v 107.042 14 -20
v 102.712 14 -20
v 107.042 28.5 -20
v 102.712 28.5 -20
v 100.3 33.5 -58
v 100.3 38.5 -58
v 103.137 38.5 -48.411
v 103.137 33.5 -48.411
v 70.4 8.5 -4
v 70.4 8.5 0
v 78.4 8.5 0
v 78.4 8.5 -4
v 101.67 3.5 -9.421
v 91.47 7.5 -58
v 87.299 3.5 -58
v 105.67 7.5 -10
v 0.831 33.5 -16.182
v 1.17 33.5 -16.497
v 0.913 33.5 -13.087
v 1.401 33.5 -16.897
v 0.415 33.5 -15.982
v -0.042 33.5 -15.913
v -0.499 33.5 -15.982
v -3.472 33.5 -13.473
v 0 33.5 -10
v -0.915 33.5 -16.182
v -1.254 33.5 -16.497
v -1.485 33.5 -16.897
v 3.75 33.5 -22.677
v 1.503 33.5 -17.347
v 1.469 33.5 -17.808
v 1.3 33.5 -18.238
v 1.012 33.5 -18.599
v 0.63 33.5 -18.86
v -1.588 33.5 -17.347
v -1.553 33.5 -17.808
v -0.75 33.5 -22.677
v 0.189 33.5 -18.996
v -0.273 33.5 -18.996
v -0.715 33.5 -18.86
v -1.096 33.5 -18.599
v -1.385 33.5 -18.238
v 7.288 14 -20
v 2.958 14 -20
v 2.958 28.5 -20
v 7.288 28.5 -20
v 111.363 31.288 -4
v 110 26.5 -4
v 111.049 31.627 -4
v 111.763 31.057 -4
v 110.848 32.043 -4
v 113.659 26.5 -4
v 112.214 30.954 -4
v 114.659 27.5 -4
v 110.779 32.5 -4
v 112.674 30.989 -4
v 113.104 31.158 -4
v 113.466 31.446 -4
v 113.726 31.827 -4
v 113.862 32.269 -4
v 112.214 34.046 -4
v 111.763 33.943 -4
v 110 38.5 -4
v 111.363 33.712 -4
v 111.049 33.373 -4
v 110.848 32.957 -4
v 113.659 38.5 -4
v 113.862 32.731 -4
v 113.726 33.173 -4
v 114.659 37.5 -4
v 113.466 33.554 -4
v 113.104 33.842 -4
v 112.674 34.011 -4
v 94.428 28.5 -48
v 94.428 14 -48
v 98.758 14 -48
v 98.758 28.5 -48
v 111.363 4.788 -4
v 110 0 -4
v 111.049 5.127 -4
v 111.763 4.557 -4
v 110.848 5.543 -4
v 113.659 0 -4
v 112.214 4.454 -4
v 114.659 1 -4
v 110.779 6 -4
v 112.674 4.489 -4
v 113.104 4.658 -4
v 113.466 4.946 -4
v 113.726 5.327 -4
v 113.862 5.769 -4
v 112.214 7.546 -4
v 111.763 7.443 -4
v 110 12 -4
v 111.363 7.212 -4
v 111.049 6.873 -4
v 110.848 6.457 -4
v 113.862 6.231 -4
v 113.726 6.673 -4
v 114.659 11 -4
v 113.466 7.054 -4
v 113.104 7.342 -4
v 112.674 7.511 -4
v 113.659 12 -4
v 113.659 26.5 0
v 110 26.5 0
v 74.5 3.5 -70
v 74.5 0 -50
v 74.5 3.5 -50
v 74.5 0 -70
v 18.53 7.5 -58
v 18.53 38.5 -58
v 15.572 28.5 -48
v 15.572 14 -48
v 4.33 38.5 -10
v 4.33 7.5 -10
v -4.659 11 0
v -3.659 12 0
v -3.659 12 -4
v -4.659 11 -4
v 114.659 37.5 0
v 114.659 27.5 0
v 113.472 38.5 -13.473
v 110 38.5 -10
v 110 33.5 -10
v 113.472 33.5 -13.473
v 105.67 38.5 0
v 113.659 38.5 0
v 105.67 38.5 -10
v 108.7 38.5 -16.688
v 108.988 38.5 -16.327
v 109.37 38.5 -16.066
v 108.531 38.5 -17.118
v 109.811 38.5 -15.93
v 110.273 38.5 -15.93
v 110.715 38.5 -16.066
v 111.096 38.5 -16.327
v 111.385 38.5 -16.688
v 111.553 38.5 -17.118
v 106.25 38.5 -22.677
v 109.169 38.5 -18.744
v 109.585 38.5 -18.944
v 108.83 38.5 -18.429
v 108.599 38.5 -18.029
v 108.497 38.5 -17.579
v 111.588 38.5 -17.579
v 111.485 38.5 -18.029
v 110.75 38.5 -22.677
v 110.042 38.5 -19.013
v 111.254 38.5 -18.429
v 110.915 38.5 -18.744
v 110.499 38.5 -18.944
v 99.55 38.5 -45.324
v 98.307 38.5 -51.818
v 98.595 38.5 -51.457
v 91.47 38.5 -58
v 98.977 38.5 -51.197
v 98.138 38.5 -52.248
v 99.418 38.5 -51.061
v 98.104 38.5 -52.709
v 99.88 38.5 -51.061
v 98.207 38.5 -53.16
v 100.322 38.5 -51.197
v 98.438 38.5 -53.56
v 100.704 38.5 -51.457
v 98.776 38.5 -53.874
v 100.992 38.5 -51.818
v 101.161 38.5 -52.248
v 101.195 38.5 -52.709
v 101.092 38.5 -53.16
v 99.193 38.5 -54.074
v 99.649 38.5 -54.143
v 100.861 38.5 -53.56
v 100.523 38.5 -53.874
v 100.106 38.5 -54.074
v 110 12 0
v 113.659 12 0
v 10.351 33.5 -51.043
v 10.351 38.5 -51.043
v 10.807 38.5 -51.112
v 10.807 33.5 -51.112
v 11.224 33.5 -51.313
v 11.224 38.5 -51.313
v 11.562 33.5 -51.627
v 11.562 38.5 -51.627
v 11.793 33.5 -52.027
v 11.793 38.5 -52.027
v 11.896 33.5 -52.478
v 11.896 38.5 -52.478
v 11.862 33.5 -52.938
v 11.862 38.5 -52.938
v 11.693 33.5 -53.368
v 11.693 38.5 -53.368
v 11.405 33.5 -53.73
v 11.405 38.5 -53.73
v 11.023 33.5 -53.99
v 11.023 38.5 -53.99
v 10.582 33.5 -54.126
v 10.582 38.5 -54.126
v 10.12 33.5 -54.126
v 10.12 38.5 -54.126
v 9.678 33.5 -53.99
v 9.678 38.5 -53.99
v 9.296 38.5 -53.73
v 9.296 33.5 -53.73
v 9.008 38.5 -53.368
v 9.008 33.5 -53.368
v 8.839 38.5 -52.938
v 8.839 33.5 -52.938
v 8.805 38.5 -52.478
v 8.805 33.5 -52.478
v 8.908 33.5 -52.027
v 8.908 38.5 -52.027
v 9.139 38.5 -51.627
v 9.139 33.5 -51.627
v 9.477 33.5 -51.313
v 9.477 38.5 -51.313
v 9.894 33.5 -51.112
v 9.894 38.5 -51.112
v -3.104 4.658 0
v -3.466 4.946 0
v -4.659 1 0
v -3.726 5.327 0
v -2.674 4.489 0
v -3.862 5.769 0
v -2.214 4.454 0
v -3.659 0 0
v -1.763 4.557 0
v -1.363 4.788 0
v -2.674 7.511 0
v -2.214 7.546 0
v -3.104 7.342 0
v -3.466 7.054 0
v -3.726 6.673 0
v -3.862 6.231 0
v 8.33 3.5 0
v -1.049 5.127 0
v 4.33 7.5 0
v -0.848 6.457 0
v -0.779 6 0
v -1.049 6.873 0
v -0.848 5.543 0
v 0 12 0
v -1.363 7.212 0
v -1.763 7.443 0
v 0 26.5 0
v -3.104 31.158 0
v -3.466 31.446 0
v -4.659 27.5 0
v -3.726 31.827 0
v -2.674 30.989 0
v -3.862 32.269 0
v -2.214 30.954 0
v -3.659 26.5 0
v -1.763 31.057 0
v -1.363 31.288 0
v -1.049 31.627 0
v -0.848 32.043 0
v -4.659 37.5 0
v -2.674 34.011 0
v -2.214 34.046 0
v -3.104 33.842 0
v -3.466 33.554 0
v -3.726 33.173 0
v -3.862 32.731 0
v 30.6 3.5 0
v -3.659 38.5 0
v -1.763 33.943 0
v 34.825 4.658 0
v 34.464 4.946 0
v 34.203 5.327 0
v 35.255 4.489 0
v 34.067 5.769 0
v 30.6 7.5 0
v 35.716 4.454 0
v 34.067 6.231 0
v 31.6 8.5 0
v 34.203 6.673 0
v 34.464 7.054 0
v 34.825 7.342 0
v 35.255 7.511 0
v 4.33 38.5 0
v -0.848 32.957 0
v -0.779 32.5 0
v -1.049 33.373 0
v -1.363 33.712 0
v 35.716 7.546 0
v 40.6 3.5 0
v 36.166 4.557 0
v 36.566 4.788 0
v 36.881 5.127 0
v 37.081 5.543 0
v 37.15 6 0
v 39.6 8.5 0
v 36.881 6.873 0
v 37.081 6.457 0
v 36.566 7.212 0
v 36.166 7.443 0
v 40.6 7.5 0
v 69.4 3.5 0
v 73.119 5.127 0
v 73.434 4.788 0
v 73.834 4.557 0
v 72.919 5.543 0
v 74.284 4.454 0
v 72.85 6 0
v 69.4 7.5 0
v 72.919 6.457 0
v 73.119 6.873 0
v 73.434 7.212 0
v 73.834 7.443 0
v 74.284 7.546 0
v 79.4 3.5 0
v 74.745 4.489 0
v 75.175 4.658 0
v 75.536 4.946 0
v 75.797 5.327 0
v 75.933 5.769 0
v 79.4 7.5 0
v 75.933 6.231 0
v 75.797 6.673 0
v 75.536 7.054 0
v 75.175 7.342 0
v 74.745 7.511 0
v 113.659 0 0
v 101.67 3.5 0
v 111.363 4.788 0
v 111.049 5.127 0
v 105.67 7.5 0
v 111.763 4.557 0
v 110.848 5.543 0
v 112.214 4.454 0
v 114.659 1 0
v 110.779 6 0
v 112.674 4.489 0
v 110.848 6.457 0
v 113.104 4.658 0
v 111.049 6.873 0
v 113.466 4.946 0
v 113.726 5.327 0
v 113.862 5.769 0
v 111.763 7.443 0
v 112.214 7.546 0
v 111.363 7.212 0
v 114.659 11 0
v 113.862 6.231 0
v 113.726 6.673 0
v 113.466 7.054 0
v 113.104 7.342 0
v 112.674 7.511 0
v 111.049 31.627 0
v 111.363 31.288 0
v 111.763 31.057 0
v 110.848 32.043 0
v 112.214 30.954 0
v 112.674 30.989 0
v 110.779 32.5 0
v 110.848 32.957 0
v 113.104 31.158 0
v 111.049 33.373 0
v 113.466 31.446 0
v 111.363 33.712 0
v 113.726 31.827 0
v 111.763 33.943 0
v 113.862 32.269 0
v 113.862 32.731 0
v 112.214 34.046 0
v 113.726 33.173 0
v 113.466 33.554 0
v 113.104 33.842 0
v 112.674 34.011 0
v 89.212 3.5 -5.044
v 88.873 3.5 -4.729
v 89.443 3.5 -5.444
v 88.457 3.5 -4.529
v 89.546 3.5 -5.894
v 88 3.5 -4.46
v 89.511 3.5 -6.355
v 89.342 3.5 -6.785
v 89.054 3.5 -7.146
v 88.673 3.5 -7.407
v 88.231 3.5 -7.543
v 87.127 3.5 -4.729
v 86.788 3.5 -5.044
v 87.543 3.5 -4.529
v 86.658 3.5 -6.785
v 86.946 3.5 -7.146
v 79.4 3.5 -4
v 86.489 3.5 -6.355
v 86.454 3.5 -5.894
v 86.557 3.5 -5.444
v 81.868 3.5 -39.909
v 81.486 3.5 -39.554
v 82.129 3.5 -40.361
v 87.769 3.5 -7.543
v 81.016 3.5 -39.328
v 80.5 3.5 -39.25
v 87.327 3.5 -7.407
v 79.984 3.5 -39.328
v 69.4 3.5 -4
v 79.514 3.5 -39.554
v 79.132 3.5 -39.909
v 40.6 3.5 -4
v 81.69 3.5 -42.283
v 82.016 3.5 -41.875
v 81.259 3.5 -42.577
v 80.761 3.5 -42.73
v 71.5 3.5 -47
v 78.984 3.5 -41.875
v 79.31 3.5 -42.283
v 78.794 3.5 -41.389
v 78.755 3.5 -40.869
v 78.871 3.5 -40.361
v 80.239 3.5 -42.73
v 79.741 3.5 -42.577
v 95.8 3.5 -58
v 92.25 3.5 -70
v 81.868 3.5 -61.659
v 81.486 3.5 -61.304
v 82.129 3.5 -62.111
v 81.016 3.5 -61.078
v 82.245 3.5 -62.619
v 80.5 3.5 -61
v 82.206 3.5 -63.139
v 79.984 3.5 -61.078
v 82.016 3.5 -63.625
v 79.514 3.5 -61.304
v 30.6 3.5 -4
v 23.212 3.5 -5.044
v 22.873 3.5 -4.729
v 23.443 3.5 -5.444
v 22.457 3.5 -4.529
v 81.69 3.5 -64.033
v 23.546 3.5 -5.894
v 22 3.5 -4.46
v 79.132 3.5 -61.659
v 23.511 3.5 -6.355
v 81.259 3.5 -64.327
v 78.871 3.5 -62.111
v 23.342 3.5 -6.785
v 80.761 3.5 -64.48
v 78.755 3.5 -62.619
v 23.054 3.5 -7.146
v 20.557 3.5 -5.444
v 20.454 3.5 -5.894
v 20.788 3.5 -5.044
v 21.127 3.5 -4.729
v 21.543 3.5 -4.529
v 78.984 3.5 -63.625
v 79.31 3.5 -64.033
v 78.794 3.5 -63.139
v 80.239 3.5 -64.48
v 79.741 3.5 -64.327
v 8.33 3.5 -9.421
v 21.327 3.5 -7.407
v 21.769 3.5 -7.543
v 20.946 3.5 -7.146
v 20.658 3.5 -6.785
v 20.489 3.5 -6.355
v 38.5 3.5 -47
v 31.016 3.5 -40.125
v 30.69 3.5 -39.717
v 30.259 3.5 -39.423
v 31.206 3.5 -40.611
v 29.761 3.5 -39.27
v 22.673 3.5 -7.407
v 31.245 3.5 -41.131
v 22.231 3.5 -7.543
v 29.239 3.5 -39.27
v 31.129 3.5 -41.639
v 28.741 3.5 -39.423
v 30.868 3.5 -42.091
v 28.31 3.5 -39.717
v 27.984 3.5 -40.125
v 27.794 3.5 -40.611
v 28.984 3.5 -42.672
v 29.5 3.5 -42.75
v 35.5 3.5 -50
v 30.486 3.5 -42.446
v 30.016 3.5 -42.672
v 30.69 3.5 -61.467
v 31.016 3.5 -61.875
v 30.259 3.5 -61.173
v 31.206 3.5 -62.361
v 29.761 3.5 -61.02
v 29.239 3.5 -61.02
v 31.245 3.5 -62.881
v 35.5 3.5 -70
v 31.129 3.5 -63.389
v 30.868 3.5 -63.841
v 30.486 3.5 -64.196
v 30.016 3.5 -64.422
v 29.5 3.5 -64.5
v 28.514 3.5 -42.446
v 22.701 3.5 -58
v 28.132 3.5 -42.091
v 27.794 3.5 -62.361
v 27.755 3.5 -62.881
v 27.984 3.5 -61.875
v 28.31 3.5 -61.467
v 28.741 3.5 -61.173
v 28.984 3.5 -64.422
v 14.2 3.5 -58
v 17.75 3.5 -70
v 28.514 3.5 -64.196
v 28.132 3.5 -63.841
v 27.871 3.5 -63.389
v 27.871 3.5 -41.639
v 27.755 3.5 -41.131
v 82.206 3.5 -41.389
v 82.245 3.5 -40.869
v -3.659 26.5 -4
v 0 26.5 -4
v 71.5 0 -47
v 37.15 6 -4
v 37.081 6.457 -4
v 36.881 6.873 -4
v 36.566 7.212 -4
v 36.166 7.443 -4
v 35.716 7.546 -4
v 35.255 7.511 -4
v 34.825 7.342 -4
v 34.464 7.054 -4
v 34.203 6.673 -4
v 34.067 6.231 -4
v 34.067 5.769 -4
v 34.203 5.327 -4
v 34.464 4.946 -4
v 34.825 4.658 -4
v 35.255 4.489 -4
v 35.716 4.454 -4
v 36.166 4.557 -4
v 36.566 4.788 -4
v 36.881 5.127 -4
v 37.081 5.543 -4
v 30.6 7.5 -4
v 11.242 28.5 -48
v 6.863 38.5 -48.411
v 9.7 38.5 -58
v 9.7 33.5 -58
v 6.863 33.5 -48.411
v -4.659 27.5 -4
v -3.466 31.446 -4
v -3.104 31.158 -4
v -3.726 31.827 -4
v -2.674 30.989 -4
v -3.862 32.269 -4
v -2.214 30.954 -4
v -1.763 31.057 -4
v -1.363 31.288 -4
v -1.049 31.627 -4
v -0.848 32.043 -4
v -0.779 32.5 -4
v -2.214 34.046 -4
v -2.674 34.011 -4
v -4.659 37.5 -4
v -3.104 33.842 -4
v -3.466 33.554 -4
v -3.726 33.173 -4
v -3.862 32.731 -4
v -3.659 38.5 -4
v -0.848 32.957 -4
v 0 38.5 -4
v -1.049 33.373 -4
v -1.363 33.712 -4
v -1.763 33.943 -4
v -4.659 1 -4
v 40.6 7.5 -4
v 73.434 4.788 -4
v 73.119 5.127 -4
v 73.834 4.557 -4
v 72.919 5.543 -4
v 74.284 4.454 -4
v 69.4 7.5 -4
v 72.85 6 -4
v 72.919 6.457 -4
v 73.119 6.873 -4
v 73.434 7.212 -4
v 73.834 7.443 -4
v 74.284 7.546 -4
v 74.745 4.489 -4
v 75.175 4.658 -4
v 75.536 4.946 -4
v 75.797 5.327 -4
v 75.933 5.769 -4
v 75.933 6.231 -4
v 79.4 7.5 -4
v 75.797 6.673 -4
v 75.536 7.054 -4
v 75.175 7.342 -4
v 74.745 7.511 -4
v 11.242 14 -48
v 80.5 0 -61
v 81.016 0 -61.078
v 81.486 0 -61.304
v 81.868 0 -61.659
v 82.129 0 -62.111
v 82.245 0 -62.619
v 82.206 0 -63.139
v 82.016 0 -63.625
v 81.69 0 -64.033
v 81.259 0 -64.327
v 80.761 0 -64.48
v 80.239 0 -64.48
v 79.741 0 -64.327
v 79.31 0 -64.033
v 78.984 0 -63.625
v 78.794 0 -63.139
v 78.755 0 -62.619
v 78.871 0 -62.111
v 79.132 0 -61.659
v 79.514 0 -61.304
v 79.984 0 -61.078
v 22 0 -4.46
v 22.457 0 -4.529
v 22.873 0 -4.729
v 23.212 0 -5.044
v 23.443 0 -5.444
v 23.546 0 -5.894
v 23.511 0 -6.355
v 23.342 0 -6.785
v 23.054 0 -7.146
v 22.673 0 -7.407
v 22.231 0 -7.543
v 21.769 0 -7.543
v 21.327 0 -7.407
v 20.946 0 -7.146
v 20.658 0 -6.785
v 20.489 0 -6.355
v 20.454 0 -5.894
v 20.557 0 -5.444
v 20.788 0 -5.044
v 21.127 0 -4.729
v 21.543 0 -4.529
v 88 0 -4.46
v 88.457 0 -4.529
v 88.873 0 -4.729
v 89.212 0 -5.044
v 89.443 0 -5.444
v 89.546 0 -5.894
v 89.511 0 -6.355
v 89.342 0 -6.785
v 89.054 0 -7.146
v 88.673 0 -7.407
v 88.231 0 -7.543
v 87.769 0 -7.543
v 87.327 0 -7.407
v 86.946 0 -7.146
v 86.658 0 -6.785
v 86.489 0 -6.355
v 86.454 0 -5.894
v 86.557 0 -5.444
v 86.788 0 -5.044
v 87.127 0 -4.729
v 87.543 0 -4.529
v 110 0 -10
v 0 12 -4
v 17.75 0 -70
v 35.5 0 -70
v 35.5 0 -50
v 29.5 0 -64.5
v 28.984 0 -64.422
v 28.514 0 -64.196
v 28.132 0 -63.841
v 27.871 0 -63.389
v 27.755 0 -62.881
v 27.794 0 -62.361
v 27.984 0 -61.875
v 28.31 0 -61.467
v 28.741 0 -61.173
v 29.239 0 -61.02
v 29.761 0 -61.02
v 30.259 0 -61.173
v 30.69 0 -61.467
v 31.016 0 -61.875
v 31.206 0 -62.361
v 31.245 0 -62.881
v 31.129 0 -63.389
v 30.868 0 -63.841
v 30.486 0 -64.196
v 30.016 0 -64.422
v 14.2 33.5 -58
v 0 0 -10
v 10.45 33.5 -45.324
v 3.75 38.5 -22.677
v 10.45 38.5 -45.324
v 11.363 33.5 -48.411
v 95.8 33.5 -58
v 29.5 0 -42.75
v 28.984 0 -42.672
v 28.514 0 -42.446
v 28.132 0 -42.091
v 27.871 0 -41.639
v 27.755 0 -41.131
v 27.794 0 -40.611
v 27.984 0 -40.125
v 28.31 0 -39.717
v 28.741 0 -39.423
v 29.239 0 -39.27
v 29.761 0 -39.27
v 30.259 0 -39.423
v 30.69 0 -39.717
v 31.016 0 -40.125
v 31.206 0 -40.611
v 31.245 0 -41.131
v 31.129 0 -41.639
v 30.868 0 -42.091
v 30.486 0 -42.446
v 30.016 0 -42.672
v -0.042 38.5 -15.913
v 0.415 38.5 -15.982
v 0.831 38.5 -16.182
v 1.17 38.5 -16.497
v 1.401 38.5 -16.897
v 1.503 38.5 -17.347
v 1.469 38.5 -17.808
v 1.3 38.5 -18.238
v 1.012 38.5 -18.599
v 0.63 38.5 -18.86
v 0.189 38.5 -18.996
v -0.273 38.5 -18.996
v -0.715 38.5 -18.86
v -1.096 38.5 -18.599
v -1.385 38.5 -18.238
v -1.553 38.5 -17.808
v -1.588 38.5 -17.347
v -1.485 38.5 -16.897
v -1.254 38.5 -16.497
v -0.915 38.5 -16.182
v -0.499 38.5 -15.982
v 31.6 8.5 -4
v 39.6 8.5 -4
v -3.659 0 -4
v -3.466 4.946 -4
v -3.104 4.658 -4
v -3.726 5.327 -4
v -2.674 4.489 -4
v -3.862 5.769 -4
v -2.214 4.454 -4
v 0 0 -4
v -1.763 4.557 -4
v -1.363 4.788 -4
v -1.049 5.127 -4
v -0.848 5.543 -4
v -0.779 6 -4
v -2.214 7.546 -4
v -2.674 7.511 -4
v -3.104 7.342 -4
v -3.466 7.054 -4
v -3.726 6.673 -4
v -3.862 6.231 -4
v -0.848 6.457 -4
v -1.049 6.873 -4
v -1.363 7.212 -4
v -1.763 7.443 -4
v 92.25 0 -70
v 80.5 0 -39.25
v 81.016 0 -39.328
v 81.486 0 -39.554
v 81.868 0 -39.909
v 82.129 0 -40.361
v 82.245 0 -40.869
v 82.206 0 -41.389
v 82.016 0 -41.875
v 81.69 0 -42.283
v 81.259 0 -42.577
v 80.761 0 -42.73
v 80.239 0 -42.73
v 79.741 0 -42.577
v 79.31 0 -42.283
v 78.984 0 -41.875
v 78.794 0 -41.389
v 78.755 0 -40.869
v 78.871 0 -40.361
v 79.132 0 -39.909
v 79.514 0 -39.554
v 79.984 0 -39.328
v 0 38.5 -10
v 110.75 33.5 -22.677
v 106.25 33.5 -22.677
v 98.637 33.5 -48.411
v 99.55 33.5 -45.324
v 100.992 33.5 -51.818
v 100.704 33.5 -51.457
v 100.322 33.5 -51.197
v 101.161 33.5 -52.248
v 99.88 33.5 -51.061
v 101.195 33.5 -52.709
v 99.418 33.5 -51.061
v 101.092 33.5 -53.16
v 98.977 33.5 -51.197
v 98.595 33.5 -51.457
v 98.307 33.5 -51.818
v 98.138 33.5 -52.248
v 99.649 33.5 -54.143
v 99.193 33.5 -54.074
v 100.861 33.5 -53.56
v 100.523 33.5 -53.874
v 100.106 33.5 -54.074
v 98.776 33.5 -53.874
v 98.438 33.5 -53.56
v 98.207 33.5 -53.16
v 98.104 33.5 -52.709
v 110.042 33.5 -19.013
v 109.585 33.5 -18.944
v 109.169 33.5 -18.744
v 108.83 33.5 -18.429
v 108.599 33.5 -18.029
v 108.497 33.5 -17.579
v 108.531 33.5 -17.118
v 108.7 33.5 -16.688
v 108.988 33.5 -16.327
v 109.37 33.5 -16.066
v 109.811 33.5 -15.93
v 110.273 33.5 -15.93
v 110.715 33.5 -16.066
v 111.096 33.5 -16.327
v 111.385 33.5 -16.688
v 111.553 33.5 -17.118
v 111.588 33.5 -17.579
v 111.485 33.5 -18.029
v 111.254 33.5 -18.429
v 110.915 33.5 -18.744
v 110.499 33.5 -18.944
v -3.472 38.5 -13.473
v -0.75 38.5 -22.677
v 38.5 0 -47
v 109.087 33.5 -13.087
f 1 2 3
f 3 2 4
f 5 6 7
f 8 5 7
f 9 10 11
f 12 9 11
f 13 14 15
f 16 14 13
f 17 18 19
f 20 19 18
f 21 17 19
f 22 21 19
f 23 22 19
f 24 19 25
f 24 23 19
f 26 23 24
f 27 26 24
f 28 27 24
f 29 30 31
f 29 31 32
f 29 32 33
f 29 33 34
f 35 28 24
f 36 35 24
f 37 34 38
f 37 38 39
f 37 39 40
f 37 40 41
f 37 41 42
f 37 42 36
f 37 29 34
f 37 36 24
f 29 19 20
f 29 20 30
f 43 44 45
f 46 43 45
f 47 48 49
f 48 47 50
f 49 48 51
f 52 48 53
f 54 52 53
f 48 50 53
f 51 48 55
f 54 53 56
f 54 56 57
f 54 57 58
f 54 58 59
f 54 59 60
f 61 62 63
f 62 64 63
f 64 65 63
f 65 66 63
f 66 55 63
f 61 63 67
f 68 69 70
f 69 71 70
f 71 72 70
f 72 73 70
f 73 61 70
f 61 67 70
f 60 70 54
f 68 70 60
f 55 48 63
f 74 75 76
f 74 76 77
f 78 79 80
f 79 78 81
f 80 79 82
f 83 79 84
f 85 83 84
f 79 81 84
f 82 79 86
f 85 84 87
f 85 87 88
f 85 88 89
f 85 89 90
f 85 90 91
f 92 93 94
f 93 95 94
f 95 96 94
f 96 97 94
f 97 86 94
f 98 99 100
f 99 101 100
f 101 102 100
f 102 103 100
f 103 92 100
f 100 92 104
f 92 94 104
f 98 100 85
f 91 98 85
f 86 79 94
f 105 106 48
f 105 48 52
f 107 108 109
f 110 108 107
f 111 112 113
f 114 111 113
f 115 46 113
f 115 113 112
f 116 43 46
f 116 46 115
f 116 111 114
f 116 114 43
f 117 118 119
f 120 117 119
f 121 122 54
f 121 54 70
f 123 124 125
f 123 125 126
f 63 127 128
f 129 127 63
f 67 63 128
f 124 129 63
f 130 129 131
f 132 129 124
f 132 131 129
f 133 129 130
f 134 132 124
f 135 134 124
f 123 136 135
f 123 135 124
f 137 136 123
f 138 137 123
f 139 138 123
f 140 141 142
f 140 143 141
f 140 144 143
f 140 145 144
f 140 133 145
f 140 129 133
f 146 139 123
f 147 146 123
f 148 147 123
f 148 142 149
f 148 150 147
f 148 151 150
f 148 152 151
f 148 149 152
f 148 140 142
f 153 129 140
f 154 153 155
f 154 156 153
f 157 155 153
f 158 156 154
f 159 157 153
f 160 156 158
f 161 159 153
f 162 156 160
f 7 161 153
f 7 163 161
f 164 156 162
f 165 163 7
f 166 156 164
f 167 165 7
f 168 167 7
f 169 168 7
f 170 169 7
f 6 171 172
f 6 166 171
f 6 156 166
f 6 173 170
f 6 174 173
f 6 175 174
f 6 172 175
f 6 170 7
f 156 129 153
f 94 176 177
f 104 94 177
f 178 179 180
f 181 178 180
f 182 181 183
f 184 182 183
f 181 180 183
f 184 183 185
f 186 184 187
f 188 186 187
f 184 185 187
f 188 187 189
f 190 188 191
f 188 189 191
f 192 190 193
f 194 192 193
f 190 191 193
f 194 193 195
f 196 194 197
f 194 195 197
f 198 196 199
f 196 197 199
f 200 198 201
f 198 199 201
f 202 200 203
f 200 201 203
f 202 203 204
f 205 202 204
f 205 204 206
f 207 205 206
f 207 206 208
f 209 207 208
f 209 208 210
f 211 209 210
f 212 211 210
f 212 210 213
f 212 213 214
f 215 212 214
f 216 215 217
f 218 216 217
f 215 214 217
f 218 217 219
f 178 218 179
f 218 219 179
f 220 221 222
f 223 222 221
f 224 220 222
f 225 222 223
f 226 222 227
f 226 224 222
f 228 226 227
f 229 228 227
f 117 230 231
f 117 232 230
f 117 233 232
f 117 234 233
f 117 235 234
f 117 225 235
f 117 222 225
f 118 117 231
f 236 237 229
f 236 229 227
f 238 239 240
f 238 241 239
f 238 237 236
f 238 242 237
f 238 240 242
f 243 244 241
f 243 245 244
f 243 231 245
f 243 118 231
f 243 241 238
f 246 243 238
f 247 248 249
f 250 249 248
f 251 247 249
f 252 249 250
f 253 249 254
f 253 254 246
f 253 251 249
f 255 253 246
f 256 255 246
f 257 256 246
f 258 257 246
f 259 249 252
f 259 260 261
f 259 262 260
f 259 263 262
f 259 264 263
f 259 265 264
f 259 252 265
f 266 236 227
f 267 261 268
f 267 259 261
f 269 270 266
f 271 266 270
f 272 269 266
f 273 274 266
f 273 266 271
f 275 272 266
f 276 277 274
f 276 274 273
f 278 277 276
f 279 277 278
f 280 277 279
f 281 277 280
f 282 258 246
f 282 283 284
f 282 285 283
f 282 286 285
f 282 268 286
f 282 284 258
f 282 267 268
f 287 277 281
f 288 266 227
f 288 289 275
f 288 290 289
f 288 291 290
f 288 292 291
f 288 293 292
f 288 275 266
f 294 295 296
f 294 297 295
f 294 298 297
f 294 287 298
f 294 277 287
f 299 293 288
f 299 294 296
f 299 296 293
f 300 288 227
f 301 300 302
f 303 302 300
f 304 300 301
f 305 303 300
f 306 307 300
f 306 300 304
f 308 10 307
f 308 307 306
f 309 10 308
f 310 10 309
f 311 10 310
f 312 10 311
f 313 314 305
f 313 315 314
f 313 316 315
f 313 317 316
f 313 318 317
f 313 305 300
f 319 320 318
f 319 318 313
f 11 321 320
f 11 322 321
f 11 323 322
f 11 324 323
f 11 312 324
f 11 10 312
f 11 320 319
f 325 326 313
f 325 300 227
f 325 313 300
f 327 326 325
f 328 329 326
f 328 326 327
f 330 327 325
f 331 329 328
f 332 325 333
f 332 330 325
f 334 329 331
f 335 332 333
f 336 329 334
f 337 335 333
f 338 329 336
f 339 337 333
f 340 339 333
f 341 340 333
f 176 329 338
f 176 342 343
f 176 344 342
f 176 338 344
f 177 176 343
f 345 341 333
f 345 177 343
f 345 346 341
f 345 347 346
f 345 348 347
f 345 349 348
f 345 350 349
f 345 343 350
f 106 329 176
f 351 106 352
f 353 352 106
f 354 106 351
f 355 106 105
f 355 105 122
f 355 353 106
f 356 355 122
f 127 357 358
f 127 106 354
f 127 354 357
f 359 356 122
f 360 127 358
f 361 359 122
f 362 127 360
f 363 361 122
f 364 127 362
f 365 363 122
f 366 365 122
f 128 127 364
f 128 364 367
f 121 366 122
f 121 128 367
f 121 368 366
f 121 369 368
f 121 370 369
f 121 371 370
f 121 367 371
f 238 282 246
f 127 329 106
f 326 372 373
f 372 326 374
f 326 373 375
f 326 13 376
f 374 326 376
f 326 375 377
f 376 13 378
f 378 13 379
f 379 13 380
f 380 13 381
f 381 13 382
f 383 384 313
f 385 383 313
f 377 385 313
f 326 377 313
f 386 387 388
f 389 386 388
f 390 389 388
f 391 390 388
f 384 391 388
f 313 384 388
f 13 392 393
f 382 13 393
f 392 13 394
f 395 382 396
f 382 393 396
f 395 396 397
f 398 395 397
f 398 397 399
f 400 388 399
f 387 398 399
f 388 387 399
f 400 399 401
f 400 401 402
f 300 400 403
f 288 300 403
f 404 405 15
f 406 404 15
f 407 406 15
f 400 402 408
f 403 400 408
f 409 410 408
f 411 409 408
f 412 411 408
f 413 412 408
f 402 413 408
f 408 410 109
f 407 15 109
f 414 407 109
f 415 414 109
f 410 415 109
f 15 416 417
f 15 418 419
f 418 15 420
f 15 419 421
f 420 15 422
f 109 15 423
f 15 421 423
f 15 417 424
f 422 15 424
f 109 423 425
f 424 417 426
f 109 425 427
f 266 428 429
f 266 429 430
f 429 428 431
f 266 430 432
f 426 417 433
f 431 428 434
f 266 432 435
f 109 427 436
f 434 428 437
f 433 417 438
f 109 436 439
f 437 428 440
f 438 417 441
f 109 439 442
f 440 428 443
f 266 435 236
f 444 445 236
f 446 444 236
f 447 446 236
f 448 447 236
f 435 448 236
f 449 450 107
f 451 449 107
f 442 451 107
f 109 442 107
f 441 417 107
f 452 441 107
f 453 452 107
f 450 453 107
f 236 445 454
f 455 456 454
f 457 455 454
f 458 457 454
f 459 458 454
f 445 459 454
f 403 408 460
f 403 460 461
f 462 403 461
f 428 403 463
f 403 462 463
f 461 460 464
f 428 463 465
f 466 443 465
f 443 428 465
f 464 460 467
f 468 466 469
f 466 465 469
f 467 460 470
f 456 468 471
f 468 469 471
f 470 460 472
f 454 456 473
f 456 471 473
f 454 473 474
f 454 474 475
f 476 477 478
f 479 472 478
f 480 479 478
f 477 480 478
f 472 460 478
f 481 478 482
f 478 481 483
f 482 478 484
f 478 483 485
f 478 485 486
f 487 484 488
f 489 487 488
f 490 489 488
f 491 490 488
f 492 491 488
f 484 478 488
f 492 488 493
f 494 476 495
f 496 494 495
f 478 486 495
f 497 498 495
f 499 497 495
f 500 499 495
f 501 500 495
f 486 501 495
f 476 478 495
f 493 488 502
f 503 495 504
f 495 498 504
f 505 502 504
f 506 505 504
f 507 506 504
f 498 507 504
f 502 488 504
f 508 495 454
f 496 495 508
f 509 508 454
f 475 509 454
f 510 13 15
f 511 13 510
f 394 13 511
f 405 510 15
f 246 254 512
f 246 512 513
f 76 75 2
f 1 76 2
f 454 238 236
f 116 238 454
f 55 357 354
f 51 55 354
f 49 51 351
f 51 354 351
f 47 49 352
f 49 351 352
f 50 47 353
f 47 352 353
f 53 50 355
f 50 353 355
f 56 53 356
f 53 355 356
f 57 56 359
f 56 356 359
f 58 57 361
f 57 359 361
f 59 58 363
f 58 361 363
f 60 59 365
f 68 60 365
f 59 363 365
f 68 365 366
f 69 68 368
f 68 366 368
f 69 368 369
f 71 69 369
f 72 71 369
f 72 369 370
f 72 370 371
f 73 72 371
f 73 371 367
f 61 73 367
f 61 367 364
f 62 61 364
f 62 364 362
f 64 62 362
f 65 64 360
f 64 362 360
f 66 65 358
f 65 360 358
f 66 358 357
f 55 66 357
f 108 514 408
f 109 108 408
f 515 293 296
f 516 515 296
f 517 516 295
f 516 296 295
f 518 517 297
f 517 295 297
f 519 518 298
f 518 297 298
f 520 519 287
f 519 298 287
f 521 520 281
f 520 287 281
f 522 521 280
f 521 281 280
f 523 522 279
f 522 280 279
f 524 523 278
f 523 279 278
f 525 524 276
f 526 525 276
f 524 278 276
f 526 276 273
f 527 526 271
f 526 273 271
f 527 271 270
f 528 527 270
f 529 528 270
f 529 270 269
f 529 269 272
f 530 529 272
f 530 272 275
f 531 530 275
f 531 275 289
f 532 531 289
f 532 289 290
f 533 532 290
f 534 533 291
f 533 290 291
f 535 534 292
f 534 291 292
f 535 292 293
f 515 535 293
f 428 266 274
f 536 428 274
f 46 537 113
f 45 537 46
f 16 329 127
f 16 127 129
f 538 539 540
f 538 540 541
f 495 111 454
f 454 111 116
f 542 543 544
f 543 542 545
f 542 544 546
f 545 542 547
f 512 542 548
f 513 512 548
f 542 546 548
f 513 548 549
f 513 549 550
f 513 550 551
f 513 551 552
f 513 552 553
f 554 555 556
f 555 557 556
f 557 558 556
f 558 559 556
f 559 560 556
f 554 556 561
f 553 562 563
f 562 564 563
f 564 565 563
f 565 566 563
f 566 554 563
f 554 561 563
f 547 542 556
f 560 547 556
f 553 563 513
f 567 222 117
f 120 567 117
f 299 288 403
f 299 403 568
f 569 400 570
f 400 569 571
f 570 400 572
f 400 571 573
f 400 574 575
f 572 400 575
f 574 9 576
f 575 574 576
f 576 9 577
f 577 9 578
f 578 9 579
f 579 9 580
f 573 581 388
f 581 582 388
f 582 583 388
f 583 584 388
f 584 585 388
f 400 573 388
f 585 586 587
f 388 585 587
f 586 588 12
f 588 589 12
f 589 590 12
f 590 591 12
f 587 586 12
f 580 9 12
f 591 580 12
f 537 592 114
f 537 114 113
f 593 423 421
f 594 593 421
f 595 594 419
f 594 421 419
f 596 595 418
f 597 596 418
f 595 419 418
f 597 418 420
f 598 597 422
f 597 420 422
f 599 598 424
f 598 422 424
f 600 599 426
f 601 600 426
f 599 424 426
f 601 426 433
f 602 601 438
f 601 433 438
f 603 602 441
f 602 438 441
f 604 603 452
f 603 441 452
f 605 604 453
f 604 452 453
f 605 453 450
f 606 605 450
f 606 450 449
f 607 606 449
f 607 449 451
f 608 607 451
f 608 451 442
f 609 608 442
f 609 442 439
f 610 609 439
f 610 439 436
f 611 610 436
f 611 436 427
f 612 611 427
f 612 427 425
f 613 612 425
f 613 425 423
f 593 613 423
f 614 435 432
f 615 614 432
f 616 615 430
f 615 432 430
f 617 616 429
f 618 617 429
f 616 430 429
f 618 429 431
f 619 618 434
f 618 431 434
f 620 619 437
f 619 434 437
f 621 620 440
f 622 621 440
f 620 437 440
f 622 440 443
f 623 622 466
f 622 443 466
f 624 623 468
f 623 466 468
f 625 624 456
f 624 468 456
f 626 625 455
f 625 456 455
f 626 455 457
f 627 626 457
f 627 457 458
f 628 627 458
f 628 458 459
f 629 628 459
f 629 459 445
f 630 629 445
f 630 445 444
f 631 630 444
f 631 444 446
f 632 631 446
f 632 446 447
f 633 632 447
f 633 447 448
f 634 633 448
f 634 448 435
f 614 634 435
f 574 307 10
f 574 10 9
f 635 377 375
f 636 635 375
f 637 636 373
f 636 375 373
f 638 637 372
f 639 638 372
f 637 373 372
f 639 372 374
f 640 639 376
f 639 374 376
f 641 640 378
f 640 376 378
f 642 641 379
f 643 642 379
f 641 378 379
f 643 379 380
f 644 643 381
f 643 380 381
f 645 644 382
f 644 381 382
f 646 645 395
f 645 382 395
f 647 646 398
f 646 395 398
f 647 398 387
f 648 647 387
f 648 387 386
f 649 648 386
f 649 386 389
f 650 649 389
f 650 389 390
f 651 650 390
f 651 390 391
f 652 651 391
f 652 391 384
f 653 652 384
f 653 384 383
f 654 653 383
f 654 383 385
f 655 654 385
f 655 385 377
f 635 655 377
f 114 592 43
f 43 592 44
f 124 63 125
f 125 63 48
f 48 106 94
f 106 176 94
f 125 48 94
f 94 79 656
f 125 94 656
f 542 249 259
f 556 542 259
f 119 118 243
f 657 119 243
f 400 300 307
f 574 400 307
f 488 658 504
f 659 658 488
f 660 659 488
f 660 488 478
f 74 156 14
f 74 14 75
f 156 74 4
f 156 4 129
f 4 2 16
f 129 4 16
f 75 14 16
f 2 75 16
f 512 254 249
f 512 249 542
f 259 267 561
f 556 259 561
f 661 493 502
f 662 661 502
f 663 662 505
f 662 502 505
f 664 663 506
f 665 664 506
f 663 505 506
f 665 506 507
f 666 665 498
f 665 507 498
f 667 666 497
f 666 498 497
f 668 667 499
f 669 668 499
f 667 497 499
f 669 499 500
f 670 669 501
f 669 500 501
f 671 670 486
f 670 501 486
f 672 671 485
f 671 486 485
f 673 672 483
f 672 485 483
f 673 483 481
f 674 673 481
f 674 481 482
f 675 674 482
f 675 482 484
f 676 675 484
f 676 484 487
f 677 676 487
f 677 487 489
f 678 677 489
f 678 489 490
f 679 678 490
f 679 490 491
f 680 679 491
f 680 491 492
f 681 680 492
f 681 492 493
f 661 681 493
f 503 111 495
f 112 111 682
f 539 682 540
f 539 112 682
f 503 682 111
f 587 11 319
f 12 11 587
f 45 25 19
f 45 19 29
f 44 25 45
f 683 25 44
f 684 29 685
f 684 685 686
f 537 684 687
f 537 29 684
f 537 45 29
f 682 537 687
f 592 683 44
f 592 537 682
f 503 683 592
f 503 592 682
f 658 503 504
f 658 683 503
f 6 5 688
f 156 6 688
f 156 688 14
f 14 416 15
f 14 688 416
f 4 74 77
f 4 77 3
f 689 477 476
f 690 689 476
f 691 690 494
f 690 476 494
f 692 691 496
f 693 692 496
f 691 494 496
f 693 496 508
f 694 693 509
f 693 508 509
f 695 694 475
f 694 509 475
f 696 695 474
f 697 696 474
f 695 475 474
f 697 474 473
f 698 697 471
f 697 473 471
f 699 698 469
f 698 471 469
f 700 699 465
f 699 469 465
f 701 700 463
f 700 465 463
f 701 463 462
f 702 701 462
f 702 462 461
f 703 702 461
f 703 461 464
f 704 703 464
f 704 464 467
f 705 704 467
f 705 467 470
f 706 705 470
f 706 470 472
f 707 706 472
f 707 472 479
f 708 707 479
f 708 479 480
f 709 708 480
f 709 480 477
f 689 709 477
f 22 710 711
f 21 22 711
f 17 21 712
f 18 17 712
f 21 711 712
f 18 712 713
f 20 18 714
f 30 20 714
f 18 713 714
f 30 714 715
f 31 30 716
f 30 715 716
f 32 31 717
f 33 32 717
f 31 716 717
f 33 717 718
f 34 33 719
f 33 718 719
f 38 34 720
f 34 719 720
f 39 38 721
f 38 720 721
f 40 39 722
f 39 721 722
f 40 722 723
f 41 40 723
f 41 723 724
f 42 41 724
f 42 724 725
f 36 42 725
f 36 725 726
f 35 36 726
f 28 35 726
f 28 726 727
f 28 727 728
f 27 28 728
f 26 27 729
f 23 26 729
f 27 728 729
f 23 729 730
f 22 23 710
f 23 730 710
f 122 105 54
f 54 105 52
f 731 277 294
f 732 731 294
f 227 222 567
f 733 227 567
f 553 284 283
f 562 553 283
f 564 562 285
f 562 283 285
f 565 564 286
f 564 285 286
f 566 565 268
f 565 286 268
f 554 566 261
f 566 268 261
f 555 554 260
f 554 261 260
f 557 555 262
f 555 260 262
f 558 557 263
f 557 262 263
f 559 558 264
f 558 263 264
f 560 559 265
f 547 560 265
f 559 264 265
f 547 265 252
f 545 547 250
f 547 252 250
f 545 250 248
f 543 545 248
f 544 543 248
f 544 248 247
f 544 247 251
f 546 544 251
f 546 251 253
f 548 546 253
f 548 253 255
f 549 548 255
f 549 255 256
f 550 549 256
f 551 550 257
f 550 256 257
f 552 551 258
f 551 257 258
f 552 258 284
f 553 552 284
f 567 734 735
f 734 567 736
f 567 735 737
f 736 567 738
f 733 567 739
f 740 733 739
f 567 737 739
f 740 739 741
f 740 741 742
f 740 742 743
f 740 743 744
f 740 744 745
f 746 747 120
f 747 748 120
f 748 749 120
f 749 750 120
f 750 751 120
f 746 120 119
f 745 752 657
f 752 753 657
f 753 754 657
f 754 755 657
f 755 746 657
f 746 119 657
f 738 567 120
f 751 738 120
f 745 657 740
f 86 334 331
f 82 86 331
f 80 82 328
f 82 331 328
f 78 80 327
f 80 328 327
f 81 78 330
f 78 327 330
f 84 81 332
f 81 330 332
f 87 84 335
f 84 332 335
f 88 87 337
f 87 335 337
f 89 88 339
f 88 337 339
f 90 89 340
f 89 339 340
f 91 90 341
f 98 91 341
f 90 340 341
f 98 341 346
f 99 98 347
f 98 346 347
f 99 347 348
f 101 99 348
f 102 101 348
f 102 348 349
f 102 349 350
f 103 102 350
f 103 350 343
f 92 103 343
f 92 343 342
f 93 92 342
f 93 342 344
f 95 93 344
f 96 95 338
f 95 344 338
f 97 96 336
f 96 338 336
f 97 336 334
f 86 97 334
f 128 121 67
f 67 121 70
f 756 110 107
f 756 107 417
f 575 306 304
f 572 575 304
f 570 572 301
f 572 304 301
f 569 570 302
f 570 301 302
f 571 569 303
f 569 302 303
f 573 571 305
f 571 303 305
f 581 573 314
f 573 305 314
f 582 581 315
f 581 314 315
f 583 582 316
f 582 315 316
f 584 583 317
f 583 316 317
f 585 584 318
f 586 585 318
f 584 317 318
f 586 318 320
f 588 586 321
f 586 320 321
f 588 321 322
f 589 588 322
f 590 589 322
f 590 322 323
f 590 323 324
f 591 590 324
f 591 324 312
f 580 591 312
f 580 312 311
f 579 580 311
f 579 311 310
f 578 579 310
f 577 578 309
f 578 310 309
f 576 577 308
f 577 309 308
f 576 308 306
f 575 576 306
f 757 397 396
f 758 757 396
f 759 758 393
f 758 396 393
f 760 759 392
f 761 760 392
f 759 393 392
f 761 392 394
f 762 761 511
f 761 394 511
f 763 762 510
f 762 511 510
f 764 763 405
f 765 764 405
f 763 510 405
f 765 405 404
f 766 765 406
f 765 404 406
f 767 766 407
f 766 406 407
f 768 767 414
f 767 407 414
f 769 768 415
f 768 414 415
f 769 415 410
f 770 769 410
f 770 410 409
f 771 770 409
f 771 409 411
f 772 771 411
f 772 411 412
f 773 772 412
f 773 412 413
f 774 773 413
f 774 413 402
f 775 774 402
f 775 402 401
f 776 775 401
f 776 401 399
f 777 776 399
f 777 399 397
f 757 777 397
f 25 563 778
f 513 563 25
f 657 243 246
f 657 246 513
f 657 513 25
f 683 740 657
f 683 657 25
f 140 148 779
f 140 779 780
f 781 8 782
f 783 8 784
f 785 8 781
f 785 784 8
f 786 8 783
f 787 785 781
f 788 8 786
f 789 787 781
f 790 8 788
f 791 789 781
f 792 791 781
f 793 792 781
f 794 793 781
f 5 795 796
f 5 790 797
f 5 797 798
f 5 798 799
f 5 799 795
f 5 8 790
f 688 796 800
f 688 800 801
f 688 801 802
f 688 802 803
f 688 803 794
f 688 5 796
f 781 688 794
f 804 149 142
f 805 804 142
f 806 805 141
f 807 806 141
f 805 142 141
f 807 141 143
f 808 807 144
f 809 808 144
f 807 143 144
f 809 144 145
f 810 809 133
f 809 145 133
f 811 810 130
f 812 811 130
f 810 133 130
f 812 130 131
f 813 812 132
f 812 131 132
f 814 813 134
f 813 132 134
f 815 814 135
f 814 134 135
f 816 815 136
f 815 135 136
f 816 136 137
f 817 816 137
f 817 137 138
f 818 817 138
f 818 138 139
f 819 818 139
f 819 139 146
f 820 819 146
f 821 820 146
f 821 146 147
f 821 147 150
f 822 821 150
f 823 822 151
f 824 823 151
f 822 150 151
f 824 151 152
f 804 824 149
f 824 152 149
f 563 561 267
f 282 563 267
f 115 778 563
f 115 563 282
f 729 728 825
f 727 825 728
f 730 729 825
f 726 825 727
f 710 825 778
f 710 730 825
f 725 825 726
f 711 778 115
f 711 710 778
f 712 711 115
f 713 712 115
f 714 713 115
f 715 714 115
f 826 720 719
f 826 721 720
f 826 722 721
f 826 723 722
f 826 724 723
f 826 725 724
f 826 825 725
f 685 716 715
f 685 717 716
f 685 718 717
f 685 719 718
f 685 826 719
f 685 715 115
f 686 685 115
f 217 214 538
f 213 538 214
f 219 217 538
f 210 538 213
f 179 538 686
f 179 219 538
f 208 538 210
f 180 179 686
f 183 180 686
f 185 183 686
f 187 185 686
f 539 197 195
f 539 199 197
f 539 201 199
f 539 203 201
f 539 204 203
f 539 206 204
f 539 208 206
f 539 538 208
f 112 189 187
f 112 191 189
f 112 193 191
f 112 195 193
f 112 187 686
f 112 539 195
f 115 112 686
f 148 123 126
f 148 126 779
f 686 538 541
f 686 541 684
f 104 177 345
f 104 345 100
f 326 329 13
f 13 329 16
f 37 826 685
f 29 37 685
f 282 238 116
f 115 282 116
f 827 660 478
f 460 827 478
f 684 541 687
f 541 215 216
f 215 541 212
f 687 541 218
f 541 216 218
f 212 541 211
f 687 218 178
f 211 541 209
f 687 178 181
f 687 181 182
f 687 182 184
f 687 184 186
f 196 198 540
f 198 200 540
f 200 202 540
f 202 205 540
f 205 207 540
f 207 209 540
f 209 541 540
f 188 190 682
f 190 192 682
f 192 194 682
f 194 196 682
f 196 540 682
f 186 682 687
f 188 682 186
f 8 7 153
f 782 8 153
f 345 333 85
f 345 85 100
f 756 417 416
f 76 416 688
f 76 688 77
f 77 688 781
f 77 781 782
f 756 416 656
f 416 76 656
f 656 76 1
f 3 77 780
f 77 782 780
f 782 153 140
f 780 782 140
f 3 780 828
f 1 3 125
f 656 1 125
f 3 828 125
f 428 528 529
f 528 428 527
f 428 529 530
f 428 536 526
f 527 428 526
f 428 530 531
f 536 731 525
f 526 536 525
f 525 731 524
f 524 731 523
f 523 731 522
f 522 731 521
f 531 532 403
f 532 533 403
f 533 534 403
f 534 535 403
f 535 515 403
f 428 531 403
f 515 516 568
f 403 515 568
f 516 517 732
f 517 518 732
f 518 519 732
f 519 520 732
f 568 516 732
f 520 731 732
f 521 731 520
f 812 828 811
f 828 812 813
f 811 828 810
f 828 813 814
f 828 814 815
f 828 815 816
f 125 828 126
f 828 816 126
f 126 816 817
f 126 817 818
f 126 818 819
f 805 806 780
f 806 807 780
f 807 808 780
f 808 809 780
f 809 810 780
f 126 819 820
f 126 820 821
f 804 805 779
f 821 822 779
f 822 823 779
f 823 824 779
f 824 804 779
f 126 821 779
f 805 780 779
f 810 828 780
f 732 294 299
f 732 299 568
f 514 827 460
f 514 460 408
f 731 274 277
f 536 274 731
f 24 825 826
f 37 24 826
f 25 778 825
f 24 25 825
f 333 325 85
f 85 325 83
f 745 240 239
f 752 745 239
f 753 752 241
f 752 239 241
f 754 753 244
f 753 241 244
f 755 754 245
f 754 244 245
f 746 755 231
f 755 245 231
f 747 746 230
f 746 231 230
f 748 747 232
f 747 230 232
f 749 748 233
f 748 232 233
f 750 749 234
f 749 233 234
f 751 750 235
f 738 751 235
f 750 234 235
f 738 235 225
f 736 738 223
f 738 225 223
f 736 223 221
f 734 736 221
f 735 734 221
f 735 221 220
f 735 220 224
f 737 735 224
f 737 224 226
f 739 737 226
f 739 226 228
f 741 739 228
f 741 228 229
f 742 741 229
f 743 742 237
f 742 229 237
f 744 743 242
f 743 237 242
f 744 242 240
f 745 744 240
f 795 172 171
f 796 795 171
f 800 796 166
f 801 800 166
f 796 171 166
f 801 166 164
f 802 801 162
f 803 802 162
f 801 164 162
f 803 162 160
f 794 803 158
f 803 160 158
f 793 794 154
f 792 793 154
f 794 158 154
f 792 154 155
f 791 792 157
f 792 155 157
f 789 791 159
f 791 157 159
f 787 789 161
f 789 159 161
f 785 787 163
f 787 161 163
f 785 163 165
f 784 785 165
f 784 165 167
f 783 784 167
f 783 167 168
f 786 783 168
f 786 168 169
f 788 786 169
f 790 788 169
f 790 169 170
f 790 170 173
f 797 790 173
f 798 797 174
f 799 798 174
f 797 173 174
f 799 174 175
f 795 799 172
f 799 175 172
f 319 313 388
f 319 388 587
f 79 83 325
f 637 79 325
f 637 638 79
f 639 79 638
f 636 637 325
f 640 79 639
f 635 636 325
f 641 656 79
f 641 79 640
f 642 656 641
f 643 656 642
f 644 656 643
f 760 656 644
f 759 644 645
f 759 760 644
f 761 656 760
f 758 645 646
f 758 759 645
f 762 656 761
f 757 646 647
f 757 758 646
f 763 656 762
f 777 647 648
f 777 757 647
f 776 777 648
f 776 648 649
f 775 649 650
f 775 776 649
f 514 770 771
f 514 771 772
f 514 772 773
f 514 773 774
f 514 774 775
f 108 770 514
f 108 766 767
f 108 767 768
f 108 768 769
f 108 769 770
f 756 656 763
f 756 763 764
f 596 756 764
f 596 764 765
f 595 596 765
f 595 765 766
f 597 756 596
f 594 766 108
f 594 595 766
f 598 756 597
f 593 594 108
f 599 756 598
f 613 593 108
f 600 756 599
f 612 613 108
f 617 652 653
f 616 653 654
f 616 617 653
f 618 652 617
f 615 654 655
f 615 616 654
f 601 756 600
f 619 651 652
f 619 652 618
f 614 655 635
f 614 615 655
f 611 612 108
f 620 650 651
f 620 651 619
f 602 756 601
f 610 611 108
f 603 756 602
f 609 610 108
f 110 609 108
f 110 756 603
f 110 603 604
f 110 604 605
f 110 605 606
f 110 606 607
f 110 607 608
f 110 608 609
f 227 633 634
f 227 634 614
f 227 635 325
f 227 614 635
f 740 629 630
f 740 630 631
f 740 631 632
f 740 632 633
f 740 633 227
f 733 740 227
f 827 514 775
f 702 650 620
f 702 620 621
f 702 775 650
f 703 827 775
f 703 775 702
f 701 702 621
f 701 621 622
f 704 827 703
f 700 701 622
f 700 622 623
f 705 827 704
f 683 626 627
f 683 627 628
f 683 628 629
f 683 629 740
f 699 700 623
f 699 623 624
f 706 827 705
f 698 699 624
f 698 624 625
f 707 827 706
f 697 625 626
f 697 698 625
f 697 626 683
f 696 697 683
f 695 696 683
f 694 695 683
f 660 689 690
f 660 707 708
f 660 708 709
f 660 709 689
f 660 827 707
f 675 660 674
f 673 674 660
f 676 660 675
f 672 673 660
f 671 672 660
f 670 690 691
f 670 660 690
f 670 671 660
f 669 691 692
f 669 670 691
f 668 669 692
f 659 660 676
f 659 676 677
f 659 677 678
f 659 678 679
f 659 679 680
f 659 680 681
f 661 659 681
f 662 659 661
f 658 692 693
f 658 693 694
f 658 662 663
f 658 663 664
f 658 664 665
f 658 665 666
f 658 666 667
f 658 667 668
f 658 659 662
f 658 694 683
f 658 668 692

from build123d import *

# Parameters (mm, degrees)
BOSS_EXTRUDE1_DEPTH = 3.5
FILLET1_SIZE        = 3
SKETCH4_W           = 4.33
SKETCH4_H           = 10
BOSS_EXTRUDE2_DEPTH = 35
SKETCH5_W           = 10
SKETCH5_H           = 5
SKETCH5_R           = 1.55
SKETCH5_W_2         = 4.658740085
SKETCH5_H_2         = 12
BOSS_EXTRUDE3_DEPTH = 4
FILLET2_SIZE        = 1
CUT_EXTRUDE1_DEPTH  = 14
BOSS_EXTRUDE4_DEPTH = 35
SKETCH9_W           = 28
SKETCH9_H           = 14.5
CUT_EXTRUDE2_DEPTH  = 117
SKETCH10_R          = 1.75
CUT_EXTRUDE3_DEPTH  = 117
FILLET3_SIZE        = 4
SKETCH11_R          = 1.55
CUT_EXTRUDE4_DEPTH  = 95
SKETCH12_R          = 1.55
BOSS_EXTRUDE5_DEPTH = 5


with BuildPart() as part:
    # Sketch1 → Boss-Extrude1 (new body)
    with BuildSketch(Plane(origin=(0, 0, 0), x_dir=(1, 0, 0), z_dir=(0, 1, 0))):
        Polygon((35.5, 70), (35.5, 46.99950249), (74.5, 46.99950249), (74.5, 70), (110, 70), (110, 0), (0, 0), (0, 70), align=None)
    extrude(amount=BOSS_EXTRUDE1_DEPTH)

    # Fillet1
    fillet1_edges = [part.edges().sort_by_distance(p)[0] for p in [
        (35.5, 1.75, -46.99950249),
        (74.5, 1.75, -46.99950249),
    ]]
    chamfer(fillet1_edges, length=FILLET1_SIZE)

    # Sketch4 → Boss-Extrude2 (add)
    with BuildSketch(Plane(origin=(0, 3.5, 0), x_dir=(1, 0, 0), z_dir=(0, 1, 0))):
        with Locations((107.835, 5)):
            Rectangle(SKETCH4_W, SKETCH4_H)
        with Locations((2.165, 5)):
            Rectangle(SKETCH4_W, SKETCH4_H)
    extrude(amount=BOSS_EXTRUDE2_DEPTH)

    # Sketch5 → Boss-Extrude3 (add)
    # profile 1 of 6: a face of its own
    with BuildSketch(Plane.XY):
        with Locations((35.6, 6)):
            Rectangle(SKETCH5_W, SKETCH5_H)
        with Locations((35.6, 6)):
            Circle(SKETCH5_R, mode=Mode.SUBTRACT)
    # profile 2 of 6: a face of its own
    with BuildSketch(Plane.XY):
        with Locations((-2.329370043, 32.5)):
            Rectangle(SKETCH5_W_2, SKETCH5_H_2)
        with Locations((-2.329370042, 32.5)):
            Circle(SKETCH5_R, mode=Mode.SUBTRACT)
    # profile 3 of 6: a face of its own
    with BuildSketch(Plane.XY):
        with Locations((-2.329370043, 6)):
            Rectangle(SKETCH5_W_2, SKETCH5_H_2)
        with Locations((-2.329370042, 6)):
            Circle(SKETCH5_R, mode=Mode.SUBTRACT)
    # profile 4 of 6: a face of its own
    with BuildSketch(Plane.XY):
        with Locations((74.4, 6)):
            Rectangle(SKETCH5_W, SKETCH5_H)
        with Locations(Location((74.4, 6, 0), (0, 0, 180))):
            Circle(SKETCH5_R, mode=Mode.SUBTRACT)
    # profile 5 of 6: a face of its own
    with BuildSketch(Plane.XY):
        with Locations((112.329370043, 6)):
            Rectangle(SKETCH5_W_2, SKETCH5_H_2)
        with Locations(Location((112.329370042, 6, 0), (0, 0, 180))):
            Circle(SKETCH5_R, mode=Mode.SUBTRACT)
    # profile 6 of 6: a face of its own
    with BuildSketch(Plane.XY):
        with Locations((112.329370043, 32.5)):
            Rectangle(SKETCH5_W_2, SKETCH5_H_2)
        with Locations(Location((112.329370042, 32.5, 0), (0, 0, 180))):
            Circle(SKETCH5_R, mode=Mode.SUBTRACT)
    extrude(amount=-BOSS_EXTRUDE3_DEPTH)

    # Fillet2
    fillet2_edges = [part.edges().sort_by_distance(p)[0] for p in [
        (69.4, 8.5, -2),
        (79.4, 8.5, -2),
        (114.658740085, 12, -2),
        (114.658740085, 0, -2),
        (114.658740085, 38.5, -2),
        (114.658740085, 26.5, -2),
        (40.6, 8.5, -2),
        (30.6, 8.5, -2),
        (-4.658740085, 26.5, -2),
        (-4.658740085, 38.5, -2),
        (-4.658740085, 0, -2),
        (-4.658740085, 12, -2),
    ]]
    chamfer(fillet2_edges, length=FILLET2_SIZE)

    # Sketch6 → Cut-Extrude1 (cut)
    with BuildSketch(Plane(origin=(0, 3.5, 0), x_dir=(1, 0, 0), z_dir=(0, 1, 0))):
        Polygon((0, 10), (17.75, 70), (0, 70), align=None)
        Polygon((110, 70), (92.25, 70), (110, 10), align=None)
    extrude(amount=-CUT_EXTRUDE1_DEPTH, mode=Mode.SUBTRACT)

    # Sketch8 → Boss-Extrude4 (add)
    with BuildSketch(Plane(origin=(0, 3.5, 0), x_dir=(1, 0, 0), z_dir=(0, 1, 0))):
        Polygon((0, 10), (14.2, 58), (18.53, 58), (4.33, 10), align=None)
        Polygon((91.47, 58), (105.67, 10), (110, 10), (95.8, 58), align=None)
    extrude(amount=BOSS_EXTRUDE4_DEPTH)

    # Sketch9 → Cut-Extrude2 (cut)
    with BuildSketch(Plane.ZY):
        with Locations((-34, 21.25)):
            Rectangle(SKETCH9_W, SKETCH9_H)
    extrude(amount=-CUT_EXTRUDE2_DEPTH, mode=Mode.SUBTRACT)

    # Sketch10 → Cut-Extrude3 (cut)
    with BuildSketch(Plane(origin=(0, 3.5, 0), x_dir=(1, 0, 0), z_dir=(0, 1, 0))):
        with Locations(Location((80.5, 62.75, 0), (0, 0, 270))):
            Circle(SKETCH10_R)
        with Locations(Location((80.5, 41, 0), (0, 0, 270))):
            Circle(SKETCH10_R)
        with Locations(Location((29.5, 41, 0), (0, 0, 90))):
            Circle(SKETCH10_R)
        with Locations(Location((29.5, 62.75, 0), (0, 0, 90))):
            Circle(SKETCH10_R)
    extrude(amount=-CUT_EXTRUDE3_DEPTH, mode=Mode.SUBTRACT)

    # Fillet3
    fillet3_edges = [part.edges().sort_by_distance(p)[0] for p in [
        (11.43, 3.5, -34),
        (98.57, 3.5, -34),
        (4.33, 3.5, -5),
        (105.67, 3.5, -5),
    ]]
    chamfer(fillet3_edges, length=FILLET3_SIZE)

    # Sketch11 → Cut-Extrude4 (cut)
    with BuildSketch(Plane(origin=(0, 38.5, 0), x_dir=(1, 0, 0), z_dir=(0, 1, 0))):
        with Locations(Location((88, 6.01, 0), (0, 0, 270))):
            Circle(SKETCH11_R)
        with Locations(Location((22, 6.01, 0), (0, 0, 270))):
            Circle(SKETCH11_R)
    extrude(amount=-CUT_EXTRUDE4_DEPTH, mode=Mode.SUBTRACT)

    # Sketch12 → Boss-Extrude5 (add)
    # profile 1 of 4: a face of its own
    with BuildSketch(Plane(origin=(0, 38.5, 0), x_dir=(1, 0, 0), z_dir=(0, 1, 0))):
        Polygon((14.2, 58), (9.7, 58), (6.86319811, 48.410810512), (10.45001483, 45.323993792), (11.36319811, 48.410810512), align=None)
        with Locations(Location((10.350531543, 52.593346062, 0), (0, 0, 270))):
            Circle(SKETCH12_R, mode=Mode.SUBTRACT)
    # profile 2 of 4: a face of its own
    with BuildSketch(Plane(origin=(0, 38.5, 0), x_dir=(1, 0, 0), z_dir=(0, 1, 0))):
        Polygon((3.75018599, 22.676685036), (0.9133841, 13.087495548), (0, 10), (-3.472442888, 13.473432491), (-0.74981401, 22.676685036), align=None)
        with Locations(Location((-0.042195961, 17.462999569, 0), (0, 0, 270))):
            Circle(SKETCH12_R, mode=Mode.SUBTRACT)
    # profile 3 of 4: a face of its own
    with BuildSketch(Plane(origin=(0, 38.5, 0), x_dir=(1, 0, 0), z_dir=(0, 1, 0))):
        Polygon((110.74981401, 22.676685036), (106.24981401, 22.676685036), (109.0866159, 13.087495548), (110, 10), (113.472442888, 13.473432491), align=None)
        with Locations(Location((110.042195961, 17.462999569, 0), (0, 0, 90))):
            Circle(SKETCH12_R, mode=Mode.SUBTRACT)
    # profile 4 of 4: a face of its own
    with BuildSketch(Plane(origin=(0, 38.5, 0), x_dir=(1, 0, 0), z_dir=(0, 1, 0))):
        Polygon((103.13680189, 48.410810512), (99.54998517, 45.323993792), (98.63680189, 48.410810512), (95.8, 58), (100.3, 58), align=None)
        with Locations(Location((99.649468457, 52.593346062, 0), (0, 0, 90))):
            Circle(SKETCH12_R, mode=Mode.SUBTRACT)
    extrude(amount=-BOSS_EXTRUDE5_DEPTH)


solid = part.part
